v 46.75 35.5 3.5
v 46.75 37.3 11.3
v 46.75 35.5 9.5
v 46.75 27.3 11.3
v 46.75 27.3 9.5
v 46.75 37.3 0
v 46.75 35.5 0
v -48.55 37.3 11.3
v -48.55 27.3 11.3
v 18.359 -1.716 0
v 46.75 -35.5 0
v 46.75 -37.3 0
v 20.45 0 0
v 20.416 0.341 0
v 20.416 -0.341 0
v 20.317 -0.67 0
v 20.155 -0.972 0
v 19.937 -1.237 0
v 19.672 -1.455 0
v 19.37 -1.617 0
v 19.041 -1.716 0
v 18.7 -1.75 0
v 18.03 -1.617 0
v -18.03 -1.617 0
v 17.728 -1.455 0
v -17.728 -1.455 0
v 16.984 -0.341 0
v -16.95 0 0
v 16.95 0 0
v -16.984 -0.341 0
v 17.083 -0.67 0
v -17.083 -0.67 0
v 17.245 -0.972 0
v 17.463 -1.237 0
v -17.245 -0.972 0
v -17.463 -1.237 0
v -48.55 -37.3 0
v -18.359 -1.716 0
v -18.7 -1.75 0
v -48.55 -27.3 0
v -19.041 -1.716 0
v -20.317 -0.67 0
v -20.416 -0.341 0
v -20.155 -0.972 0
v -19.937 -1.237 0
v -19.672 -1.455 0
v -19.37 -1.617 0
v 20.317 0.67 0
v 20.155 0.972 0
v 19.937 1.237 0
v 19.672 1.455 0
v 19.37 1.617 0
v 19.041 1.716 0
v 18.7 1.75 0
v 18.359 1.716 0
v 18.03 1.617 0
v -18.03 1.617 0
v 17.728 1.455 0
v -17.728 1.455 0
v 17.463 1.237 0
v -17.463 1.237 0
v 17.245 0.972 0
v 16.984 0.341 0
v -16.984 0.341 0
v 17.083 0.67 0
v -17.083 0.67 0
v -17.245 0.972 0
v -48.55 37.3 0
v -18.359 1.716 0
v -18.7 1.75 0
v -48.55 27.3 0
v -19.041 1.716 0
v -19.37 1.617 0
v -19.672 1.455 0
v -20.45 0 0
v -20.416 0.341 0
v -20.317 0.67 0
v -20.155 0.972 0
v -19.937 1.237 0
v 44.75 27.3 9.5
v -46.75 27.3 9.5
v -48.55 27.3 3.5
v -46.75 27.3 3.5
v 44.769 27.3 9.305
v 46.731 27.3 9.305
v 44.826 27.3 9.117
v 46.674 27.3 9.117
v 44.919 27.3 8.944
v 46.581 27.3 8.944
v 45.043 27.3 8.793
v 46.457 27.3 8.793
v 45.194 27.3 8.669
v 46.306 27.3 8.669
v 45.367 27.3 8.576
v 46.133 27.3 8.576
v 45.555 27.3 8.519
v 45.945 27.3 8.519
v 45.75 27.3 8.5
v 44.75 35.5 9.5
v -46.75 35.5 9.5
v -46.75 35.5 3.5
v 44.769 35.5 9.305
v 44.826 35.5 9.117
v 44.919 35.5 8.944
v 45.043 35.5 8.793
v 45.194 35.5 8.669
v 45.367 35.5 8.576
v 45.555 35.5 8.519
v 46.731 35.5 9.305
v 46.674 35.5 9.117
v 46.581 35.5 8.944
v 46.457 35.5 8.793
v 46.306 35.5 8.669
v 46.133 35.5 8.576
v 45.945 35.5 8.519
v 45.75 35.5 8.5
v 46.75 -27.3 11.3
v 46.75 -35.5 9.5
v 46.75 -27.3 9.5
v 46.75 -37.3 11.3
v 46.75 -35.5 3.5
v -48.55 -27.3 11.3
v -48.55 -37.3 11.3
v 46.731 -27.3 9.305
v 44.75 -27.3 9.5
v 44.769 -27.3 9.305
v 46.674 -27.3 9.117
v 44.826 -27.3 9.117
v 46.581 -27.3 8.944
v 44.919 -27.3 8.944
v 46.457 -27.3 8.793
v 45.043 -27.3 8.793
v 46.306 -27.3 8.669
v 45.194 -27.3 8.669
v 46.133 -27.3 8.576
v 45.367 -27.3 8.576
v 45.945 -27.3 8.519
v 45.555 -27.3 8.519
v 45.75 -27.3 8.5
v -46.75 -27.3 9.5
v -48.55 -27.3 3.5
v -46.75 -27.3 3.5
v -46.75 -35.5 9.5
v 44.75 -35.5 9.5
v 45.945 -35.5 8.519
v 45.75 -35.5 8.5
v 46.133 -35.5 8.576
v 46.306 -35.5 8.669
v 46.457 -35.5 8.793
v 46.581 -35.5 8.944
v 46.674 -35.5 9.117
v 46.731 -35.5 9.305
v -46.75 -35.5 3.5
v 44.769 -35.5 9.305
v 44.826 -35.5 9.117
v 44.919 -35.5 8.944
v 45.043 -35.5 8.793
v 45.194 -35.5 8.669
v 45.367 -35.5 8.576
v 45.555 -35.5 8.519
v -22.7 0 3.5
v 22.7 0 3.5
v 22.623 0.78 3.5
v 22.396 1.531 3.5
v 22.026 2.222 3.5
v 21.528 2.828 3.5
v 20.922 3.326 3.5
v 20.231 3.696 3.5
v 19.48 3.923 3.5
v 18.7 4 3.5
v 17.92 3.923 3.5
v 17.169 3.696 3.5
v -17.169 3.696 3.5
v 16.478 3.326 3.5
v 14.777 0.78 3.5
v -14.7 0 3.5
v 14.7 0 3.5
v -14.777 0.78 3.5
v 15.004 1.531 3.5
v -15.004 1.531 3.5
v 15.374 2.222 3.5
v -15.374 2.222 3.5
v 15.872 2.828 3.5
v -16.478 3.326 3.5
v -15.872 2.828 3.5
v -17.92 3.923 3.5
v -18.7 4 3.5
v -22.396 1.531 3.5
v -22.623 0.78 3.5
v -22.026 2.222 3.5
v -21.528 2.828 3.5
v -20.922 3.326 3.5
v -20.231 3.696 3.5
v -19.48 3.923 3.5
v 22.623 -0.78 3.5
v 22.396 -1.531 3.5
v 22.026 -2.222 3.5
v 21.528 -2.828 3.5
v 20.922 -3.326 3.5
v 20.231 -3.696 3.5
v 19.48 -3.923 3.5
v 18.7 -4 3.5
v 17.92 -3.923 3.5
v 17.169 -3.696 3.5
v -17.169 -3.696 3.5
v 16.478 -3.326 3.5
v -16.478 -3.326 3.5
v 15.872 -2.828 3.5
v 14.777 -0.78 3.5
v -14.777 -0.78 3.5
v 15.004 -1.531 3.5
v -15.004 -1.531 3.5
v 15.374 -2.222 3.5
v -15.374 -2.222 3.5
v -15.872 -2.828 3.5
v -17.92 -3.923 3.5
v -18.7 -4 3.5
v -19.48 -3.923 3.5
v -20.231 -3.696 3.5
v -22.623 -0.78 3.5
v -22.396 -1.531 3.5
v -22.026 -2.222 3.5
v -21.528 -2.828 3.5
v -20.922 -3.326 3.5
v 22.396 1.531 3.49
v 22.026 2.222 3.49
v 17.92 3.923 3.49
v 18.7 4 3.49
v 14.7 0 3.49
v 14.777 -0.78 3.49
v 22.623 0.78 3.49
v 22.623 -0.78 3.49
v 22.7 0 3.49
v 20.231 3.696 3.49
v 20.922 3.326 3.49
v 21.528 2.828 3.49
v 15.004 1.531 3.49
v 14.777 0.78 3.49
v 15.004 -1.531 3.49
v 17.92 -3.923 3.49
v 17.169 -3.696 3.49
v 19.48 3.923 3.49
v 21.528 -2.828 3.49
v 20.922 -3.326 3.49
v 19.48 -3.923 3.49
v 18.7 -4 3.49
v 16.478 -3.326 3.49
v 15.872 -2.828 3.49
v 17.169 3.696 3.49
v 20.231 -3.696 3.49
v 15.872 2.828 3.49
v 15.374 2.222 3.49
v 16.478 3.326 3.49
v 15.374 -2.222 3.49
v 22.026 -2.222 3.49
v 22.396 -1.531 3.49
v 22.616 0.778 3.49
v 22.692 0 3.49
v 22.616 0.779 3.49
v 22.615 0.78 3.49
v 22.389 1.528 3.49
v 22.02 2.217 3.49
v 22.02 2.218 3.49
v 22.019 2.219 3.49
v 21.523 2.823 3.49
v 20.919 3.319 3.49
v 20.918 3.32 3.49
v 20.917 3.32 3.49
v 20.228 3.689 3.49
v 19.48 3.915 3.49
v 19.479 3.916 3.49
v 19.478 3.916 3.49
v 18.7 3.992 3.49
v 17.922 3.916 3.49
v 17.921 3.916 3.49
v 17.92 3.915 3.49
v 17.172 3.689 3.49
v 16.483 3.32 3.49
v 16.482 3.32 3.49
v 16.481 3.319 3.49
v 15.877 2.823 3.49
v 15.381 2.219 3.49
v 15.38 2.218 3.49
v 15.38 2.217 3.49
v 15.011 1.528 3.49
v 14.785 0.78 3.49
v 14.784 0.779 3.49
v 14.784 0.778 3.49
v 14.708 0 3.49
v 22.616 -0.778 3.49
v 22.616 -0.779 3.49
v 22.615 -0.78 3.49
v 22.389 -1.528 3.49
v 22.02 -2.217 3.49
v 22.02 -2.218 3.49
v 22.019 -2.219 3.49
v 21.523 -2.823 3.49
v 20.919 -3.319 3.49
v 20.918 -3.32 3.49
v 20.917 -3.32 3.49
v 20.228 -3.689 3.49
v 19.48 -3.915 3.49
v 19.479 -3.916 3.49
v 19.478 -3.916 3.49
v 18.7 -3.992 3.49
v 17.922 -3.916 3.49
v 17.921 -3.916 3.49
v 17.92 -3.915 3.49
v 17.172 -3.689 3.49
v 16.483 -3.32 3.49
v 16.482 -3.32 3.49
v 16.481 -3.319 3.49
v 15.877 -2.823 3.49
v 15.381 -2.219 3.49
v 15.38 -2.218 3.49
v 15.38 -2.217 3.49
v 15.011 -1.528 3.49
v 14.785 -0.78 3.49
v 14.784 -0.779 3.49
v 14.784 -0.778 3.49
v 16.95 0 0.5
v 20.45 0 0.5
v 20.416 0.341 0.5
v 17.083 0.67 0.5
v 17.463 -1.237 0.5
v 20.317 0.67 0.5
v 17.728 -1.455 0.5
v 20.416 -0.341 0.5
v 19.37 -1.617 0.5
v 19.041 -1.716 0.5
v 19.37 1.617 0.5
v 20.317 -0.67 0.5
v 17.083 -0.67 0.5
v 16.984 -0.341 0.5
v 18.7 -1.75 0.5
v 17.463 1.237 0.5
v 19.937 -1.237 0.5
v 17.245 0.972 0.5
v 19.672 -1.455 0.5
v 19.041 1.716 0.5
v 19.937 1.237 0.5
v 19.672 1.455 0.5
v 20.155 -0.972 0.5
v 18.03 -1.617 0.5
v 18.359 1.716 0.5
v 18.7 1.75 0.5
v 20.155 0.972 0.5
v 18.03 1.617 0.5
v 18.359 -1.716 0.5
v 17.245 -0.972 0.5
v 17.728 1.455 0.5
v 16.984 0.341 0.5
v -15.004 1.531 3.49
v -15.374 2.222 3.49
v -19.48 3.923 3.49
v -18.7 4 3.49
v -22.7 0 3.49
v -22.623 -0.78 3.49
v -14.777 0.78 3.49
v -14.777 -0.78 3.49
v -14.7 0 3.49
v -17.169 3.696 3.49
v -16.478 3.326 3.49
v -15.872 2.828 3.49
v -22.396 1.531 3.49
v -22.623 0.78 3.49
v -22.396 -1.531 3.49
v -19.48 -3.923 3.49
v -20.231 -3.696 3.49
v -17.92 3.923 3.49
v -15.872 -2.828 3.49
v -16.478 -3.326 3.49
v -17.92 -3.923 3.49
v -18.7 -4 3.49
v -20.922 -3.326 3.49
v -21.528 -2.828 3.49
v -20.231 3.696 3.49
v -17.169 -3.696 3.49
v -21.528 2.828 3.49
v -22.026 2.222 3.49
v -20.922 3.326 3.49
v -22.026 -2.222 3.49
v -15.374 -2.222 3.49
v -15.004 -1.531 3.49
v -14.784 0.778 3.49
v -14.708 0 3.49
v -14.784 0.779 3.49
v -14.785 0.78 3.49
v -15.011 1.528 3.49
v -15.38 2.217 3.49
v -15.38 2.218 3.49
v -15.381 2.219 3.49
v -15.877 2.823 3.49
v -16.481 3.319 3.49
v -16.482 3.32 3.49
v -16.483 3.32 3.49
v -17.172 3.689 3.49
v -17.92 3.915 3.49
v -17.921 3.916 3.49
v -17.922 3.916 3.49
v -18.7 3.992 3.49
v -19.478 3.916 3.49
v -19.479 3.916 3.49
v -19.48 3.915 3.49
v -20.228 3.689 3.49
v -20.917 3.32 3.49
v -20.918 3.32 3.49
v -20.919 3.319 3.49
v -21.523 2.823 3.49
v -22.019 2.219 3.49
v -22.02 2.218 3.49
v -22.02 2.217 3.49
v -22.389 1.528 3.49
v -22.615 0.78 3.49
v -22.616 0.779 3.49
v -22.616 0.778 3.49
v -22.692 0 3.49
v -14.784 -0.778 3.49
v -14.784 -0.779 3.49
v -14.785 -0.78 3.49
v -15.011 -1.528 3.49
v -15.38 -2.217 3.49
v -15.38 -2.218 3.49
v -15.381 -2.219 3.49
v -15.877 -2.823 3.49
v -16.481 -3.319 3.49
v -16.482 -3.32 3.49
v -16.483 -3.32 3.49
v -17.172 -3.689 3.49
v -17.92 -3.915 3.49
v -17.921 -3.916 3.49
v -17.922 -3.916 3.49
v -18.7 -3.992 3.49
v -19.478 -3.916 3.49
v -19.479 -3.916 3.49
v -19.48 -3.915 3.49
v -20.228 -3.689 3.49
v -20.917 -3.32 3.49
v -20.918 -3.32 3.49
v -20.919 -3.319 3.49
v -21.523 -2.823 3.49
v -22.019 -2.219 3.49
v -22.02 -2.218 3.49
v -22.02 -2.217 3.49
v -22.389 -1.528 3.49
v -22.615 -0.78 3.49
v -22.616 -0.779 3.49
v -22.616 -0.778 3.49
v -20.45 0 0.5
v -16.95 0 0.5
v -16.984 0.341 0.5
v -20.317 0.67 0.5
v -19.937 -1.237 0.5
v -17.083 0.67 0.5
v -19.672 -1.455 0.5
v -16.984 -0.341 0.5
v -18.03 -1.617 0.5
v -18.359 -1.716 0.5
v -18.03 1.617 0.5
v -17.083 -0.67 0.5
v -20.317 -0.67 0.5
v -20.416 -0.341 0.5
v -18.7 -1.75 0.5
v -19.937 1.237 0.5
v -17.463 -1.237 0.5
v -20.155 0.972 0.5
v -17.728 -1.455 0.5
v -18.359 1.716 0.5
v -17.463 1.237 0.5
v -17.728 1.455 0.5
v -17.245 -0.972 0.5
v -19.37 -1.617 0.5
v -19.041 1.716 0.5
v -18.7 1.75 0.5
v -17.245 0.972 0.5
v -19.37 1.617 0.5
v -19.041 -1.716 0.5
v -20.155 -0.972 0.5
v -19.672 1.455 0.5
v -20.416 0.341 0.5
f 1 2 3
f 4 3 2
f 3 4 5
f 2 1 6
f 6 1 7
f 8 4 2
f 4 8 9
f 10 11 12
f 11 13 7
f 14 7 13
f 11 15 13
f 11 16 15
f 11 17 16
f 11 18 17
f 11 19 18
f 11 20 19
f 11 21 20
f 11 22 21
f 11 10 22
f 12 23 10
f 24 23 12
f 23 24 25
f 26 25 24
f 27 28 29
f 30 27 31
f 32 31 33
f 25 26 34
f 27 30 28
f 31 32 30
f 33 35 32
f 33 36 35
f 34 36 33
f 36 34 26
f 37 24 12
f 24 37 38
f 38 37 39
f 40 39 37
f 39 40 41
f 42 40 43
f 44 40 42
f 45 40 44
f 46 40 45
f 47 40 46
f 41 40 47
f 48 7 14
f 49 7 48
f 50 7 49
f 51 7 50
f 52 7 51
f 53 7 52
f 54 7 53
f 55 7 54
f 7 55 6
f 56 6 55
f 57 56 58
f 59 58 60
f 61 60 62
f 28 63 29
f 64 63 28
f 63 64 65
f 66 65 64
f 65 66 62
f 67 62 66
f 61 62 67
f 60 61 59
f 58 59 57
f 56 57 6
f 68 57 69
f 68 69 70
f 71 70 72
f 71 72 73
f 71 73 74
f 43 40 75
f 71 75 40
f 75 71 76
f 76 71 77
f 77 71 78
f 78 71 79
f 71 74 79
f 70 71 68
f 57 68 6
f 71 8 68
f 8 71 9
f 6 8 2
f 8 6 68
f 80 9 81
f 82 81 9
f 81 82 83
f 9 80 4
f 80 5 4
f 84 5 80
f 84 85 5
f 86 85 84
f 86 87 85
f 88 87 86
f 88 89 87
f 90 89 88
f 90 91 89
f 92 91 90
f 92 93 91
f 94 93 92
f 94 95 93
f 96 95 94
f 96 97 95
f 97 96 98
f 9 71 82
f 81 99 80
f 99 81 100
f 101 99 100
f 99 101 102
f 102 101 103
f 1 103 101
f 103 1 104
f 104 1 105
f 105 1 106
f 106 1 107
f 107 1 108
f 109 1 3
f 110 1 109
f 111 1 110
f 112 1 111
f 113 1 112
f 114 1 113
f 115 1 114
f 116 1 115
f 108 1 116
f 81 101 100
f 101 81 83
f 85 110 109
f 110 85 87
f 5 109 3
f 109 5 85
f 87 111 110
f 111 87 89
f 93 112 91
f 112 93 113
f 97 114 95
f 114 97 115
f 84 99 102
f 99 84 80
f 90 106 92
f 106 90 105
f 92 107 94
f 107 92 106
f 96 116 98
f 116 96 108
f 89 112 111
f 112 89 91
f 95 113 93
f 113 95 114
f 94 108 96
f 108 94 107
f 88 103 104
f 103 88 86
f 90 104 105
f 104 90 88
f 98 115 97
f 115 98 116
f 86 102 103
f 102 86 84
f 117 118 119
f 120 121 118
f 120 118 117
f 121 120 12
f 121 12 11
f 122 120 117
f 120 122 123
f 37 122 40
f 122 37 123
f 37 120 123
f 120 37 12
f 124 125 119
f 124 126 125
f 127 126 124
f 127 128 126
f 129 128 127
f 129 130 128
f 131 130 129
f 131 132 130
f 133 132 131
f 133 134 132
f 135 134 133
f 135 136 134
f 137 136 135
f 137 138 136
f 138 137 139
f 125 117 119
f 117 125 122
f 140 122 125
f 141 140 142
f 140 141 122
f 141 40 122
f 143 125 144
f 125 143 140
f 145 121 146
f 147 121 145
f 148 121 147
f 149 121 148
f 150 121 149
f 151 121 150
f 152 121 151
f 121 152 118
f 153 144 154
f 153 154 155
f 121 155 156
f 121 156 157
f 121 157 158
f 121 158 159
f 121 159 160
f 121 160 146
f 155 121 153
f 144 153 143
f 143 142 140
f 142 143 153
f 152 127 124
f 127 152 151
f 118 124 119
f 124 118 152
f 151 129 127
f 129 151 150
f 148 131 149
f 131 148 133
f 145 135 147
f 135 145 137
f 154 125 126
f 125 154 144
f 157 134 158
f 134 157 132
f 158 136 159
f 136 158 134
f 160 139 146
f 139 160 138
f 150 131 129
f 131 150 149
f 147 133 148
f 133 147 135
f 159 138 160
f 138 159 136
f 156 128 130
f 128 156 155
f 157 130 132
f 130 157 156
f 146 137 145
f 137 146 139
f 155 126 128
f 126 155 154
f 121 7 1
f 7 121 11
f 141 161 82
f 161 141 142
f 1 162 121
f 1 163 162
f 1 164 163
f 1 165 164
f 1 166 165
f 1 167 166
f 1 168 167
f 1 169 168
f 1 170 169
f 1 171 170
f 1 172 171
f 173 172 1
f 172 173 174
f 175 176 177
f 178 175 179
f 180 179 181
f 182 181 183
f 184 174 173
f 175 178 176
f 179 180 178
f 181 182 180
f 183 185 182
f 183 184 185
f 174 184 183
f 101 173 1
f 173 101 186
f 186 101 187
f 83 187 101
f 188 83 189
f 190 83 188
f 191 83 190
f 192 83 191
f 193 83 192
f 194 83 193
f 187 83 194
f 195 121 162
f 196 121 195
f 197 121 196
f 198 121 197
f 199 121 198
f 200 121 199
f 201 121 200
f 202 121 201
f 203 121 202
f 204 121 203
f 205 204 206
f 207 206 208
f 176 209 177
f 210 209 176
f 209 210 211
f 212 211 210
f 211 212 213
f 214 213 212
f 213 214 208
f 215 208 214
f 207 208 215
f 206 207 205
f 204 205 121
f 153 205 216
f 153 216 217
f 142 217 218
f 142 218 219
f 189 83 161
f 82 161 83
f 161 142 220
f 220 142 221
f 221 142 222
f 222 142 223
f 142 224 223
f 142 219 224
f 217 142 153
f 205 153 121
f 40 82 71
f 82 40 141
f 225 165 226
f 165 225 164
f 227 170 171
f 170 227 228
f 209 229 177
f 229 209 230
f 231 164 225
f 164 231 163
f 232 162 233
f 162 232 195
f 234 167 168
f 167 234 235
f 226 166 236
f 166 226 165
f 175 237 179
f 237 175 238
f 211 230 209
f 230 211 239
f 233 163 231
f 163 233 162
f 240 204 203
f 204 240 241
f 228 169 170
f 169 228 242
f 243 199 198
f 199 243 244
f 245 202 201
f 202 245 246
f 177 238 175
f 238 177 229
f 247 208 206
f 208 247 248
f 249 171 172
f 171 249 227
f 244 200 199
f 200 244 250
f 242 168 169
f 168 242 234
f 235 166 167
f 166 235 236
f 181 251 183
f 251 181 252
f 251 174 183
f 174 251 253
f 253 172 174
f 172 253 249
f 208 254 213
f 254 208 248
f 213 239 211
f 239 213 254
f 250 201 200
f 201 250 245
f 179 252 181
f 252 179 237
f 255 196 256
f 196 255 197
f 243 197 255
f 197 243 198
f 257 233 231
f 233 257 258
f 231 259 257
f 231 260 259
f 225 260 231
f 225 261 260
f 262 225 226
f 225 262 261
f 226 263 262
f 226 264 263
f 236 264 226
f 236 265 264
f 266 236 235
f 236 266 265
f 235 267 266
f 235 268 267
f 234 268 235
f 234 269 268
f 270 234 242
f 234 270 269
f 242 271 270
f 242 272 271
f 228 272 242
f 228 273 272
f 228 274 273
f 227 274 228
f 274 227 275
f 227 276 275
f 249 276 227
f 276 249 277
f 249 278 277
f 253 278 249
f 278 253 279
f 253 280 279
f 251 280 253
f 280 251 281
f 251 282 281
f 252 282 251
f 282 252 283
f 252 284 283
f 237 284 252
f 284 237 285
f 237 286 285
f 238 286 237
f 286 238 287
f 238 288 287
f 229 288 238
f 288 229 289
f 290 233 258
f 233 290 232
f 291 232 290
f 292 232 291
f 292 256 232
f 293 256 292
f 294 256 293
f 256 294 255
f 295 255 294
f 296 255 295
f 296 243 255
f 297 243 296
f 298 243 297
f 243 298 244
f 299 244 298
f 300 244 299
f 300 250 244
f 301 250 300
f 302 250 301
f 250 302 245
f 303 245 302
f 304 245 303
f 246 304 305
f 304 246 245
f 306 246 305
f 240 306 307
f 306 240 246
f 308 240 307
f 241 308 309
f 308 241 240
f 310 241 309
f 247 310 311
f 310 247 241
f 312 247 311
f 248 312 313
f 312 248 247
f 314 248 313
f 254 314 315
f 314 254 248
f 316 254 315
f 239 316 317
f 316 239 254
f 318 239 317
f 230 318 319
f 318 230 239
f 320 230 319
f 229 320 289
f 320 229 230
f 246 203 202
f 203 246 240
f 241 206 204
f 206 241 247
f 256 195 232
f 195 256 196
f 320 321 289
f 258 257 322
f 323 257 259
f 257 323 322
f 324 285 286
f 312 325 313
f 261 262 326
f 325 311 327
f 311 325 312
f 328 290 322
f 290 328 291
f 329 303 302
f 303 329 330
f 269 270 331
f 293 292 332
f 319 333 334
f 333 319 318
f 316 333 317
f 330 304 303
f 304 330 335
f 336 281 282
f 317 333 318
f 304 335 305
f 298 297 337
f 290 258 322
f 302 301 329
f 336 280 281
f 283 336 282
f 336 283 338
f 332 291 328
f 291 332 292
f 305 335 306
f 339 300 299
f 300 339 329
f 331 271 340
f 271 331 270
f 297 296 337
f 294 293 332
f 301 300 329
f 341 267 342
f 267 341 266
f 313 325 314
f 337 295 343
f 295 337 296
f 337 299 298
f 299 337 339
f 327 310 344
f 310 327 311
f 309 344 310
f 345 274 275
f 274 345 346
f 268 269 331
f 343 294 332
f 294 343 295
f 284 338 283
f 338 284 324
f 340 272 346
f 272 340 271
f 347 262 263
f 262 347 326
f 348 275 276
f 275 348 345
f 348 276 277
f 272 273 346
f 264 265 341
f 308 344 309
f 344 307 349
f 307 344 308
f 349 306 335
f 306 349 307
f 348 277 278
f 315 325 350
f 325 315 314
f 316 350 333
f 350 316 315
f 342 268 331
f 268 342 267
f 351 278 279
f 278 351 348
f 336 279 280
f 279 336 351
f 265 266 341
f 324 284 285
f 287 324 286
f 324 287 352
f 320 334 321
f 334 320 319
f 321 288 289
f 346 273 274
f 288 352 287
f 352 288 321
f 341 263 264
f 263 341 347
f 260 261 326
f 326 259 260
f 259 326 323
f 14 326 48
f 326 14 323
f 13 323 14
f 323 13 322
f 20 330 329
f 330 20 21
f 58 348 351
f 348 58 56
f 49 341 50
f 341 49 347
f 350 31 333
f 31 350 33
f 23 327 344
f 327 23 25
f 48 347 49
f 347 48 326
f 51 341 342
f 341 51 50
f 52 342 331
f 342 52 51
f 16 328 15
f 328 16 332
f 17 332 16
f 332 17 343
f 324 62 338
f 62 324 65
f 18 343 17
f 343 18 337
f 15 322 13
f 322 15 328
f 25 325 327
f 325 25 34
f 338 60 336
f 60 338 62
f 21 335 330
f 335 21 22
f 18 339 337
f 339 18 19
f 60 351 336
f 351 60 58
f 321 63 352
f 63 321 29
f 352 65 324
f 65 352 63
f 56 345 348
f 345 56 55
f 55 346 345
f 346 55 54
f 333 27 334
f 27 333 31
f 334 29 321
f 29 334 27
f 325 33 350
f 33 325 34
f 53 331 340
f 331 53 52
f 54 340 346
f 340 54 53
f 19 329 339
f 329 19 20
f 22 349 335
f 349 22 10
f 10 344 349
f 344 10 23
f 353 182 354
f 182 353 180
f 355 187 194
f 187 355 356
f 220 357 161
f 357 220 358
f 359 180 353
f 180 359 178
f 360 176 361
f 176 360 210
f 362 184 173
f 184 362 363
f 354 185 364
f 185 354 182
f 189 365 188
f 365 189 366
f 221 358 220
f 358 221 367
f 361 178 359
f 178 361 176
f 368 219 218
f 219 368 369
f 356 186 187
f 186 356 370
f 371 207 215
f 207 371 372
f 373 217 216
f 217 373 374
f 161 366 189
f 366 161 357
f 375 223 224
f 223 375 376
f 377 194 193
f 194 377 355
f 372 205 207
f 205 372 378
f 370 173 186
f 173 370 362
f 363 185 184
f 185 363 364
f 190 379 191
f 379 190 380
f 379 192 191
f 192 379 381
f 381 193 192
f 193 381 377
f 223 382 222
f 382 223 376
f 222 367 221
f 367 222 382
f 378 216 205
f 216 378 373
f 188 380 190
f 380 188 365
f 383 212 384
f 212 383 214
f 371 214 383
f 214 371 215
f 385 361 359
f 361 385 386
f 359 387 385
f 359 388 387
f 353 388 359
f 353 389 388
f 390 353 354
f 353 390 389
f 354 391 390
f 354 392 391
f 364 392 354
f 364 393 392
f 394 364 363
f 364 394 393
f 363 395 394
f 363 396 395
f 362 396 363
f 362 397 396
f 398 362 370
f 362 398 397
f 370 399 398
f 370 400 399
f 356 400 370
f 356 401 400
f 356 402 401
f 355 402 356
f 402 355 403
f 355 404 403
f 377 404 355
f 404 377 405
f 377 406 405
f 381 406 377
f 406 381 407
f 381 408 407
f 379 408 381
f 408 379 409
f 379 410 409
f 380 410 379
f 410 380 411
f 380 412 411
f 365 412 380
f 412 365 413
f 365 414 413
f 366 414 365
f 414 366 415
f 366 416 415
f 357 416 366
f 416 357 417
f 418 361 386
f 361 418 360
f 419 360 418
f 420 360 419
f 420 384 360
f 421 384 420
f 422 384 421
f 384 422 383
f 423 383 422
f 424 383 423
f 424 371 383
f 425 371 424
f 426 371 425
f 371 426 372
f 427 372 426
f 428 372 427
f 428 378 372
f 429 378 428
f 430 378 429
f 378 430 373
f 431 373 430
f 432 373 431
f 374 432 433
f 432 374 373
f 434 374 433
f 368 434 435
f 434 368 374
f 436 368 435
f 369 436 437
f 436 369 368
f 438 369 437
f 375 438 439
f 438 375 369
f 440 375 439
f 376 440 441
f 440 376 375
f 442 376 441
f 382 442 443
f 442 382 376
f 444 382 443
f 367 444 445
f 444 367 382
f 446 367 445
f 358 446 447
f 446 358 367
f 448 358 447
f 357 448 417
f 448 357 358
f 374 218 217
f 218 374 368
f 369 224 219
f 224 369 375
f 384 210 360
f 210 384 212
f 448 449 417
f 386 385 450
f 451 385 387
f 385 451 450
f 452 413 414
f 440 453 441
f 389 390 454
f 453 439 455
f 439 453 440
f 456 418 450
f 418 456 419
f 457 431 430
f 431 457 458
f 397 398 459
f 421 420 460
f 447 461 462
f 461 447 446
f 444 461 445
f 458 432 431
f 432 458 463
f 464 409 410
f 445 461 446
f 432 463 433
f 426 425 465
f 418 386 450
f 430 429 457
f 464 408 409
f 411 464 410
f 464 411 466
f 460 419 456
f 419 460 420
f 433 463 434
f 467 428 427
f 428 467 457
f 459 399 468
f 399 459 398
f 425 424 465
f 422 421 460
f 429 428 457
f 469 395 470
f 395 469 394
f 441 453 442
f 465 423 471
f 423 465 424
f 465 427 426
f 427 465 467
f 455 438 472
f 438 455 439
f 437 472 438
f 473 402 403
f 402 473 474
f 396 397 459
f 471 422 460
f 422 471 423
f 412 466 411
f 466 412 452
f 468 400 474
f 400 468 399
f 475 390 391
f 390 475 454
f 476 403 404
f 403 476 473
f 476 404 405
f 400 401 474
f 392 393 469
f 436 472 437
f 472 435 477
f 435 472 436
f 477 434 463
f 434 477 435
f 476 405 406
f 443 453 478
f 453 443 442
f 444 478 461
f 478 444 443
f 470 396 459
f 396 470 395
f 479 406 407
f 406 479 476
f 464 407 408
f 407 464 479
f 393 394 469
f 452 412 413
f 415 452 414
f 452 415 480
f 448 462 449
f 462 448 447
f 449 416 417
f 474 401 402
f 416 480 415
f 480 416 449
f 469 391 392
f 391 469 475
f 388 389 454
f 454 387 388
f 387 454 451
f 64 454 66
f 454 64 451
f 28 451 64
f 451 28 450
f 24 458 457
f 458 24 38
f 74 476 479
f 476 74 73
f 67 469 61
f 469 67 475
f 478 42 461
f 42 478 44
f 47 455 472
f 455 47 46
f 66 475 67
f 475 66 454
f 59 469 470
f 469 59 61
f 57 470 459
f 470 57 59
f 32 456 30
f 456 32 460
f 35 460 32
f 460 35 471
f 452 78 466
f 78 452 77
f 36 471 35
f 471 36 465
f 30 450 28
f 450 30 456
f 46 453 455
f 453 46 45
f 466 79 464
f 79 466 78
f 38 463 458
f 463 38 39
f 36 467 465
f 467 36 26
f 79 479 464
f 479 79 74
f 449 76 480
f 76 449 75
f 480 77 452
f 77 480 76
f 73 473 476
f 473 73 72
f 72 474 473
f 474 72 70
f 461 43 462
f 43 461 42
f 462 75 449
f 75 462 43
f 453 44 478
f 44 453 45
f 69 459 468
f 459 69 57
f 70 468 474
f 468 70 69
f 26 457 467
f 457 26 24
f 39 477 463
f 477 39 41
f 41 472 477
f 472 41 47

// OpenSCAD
t=1.8;
$fn=32;

baseD=[93.5, 71, 6];
baseScrewDistance=69.5;
baseScrewOffset=2;
plateT=3.5;

bracket();
// sidePiece();

module bracket() {
  difference() {
    union() {
      translate([-baseD[0]/2-t,-baseD[1]/2,0]) cube([baseD[0]+t, baseD[1], plateT]);
      sidePiece();
      mirror([0,1,0]) sidePiece();
    }
    translate([baseD[0]/5,0,-2.5]) screw();
    translate([-baseD[0]/5,0,-2.5]) screw();
    // baseScrews();
  }
}

module baseScrews() {
  translate([-baseScrewDistance/2-baseScrewOffset,0,-1]) {
    baseScrew();
    translate([baseScrewDistance,0,0]) baseScrew();
  }
}

module baseScrew() {
  translate([0,0,-0.1]) cylinder(r=3.25,h=2.6, $fn=6);
  cylinder(r=1.8,h=6);
}

module sidePiece() {
  translate([-baseD[0]/2-t,baseD[1]/2-10+t,0]) {
    difference() {
      cube([baseD[0]+t, 10, baseD[2]+plateT+t]);
      translate([-0.1,-t,0]) cube([baseD[0]+t+0.2, 10, baseD[2]+plateT]);
    }
    cube([t,10,10]);
    translate([baseD[0]+t-1,0,baseD[2]+plateT]) rotate([-90,0,0]) cylinder(r=1,h=10);
  }
}

module screw() {
    translate([0,0,5.99]) cylinder(r=4,h=0.2);
    translate([0,0,3]) cylinder(r1=1.75, r2=4, h=3);
    cylinder(r=1.75,h=3.1);
    translate([0,0,-0.19]) cylinder(r=1.75, h=0.2);
}

module base() {
  color("black") translate([-baseD[0]/2,-baseD[1]/2,plateT]) difference() {
    cube(baseD);
  }
}
//cube([93.5, 71, t]);
//cube([93.5, 71, 6]);
